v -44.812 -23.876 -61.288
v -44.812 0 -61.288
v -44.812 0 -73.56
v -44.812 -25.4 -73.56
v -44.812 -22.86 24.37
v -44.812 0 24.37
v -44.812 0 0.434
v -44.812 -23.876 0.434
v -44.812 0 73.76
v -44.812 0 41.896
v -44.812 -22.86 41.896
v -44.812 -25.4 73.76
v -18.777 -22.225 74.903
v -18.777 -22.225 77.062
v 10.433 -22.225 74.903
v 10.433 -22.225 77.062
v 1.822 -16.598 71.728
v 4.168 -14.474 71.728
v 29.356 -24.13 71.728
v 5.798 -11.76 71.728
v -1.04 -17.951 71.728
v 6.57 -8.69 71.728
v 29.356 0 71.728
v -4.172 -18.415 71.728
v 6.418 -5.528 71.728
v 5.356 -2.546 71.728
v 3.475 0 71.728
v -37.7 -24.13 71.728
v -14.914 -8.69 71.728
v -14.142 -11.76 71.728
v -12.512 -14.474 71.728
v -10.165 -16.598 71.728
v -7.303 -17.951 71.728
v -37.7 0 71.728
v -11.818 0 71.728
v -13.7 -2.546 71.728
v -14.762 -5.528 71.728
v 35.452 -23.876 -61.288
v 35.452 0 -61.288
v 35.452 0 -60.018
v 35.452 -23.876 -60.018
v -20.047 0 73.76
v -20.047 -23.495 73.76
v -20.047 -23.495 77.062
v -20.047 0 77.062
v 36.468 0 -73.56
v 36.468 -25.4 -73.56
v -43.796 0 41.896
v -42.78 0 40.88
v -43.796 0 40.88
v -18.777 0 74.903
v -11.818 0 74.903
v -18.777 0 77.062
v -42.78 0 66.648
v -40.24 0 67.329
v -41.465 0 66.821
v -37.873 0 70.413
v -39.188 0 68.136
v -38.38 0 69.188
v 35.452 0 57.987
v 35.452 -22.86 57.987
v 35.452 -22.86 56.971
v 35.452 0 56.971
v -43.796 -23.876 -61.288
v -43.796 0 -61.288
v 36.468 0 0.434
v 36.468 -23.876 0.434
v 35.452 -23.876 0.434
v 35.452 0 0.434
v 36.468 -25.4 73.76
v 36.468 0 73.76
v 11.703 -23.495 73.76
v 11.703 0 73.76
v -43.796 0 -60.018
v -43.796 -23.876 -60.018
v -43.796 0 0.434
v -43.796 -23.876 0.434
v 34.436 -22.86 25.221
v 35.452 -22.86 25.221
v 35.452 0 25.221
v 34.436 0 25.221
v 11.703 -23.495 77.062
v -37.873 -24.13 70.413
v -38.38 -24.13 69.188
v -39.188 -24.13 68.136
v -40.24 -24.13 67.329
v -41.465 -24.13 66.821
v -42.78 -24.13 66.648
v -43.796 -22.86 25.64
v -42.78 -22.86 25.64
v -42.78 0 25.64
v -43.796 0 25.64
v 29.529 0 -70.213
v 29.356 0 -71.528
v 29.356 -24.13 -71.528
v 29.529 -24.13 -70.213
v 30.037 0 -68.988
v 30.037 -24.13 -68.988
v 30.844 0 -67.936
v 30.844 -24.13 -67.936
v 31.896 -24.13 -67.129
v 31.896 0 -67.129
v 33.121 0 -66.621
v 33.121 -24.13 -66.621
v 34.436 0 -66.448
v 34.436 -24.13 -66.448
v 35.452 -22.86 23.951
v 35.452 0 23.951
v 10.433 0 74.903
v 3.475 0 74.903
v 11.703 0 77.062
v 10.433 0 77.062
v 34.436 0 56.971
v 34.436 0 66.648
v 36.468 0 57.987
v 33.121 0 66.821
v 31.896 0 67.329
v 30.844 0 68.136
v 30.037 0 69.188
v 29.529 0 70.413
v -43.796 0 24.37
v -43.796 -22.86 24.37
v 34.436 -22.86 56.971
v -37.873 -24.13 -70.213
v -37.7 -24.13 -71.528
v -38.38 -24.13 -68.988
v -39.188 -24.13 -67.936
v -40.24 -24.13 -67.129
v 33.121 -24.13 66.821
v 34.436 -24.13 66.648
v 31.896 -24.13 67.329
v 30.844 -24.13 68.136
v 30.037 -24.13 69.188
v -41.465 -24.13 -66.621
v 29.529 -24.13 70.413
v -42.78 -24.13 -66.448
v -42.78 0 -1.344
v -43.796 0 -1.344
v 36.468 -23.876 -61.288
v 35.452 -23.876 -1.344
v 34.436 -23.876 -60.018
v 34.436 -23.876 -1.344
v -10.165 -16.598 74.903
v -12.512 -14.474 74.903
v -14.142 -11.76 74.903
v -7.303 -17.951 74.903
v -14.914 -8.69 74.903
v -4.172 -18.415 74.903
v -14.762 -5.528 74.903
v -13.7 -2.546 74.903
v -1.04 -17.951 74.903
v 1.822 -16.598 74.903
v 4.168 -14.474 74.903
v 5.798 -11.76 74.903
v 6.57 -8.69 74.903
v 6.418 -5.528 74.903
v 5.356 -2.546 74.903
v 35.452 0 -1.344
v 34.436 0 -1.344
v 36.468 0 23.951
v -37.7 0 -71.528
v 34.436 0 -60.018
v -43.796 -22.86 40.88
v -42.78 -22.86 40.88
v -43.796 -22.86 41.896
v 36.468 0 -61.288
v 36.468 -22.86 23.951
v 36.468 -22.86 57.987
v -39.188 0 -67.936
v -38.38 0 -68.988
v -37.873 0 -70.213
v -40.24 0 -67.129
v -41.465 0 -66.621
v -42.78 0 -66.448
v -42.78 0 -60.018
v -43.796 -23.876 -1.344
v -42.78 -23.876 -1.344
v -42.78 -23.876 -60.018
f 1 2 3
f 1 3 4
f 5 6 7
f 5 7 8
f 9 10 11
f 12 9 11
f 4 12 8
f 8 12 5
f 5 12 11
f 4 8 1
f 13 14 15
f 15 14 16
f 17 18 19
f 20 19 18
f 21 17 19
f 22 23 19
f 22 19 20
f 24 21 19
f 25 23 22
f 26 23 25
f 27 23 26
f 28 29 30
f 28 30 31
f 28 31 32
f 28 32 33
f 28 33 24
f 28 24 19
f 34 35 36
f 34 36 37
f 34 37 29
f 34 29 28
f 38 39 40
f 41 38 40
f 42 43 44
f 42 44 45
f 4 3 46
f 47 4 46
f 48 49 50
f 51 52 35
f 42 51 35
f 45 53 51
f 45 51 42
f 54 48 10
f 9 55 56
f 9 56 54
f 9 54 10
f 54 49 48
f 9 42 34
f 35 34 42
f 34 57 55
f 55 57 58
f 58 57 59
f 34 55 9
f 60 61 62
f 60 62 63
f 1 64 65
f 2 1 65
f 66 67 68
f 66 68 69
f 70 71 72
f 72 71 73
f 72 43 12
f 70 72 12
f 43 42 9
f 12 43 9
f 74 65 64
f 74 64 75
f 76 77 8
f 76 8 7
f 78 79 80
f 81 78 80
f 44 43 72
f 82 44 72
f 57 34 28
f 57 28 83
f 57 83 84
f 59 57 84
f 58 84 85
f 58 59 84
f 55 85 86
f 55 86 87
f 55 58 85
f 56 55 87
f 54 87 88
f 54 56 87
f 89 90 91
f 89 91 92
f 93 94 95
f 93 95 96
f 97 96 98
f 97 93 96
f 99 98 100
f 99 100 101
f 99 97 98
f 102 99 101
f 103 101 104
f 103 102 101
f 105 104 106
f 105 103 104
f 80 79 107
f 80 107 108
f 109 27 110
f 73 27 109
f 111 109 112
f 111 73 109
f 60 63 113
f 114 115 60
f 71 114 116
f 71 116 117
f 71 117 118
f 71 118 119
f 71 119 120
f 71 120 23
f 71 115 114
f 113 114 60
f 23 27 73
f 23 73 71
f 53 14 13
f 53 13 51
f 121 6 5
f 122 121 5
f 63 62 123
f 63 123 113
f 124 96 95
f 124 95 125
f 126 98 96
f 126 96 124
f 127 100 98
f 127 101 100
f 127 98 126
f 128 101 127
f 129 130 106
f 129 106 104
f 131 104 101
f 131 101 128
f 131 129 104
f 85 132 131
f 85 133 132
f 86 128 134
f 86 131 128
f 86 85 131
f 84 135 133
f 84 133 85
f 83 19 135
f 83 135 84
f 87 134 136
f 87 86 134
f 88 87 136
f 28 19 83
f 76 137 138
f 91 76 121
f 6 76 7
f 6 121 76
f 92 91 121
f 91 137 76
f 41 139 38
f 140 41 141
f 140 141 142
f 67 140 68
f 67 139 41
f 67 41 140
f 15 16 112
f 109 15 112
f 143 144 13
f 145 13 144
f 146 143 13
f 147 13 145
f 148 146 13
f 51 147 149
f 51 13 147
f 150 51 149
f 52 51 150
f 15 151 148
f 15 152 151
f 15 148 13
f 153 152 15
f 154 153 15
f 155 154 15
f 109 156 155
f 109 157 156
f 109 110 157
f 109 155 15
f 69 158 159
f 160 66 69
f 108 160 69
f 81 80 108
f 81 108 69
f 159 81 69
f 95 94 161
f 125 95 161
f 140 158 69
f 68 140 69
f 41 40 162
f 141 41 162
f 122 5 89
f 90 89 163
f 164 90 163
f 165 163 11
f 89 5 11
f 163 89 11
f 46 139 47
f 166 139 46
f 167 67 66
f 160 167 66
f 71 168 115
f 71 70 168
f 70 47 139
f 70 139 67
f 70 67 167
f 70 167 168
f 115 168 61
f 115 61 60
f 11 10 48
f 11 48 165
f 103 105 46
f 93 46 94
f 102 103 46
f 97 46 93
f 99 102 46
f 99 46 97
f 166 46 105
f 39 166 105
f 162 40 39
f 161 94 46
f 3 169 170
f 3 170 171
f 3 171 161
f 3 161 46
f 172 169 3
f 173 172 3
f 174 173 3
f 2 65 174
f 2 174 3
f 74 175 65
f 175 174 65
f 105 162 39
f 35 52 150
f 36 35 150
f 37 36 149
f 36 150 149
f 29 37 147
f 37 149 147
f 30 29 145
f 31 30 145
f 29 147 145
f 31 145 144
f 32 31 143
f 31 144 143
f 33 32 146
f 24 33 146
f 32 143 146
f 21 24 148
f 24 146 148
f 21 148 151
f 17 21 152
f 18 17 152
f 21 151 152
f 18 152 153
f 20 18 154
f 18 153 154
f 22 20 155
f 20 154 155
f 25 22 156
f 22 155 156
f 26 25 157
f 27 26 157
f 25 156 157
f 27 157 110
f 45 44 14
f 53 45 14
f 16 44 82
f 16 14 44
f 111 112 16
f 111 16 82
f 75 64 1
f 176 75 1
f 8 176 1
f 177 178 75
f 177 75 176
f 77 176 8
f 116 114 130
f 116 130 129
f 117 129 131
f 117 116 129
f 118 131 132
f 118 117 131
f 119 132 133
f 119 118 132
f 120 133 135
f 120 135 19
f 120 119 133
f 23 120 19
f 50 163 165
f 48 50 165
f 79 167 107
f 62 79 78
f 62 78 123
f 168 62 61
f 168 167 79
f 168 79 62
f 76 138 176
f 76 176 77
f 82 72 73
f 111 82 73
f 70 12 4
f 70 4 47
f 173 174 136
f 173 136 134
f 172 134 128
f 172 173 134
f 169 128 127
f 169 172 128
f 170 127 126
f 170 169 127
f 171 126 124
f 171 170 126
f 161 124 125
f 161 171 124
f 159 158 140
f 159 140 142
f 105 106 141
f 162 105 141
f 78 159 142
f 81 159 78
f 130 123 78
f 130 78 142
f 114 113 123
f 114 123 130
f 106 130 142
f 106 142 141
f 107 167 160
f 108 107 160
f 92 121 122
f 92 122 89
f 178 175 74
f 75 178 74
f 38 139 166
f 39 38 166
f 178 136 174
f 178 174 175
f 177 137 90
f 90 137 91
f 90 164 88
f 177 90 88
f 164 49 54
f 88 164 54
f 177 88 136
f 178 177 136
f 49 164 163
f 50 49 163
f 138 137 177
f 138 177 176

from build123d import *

# Parameters (mm, degrees)
F1_DEPTH  = 25.4
F2_W      = 77.216
F2_H      = 143.256
F3_DEPTH  = 24.13
F4_W      = 0.889
F4_H      = 6.858
F4_W_2    = 6.858
F4_H_2    = 0.889
F5_DEPTH  = 81.281
F6_W      = 5.0038
F6_H      = 0.6858
F7_DEPTH  = 81.281
F8_W      = 5.0038
F8_H      = 0.6858
F9_DEPTH  = 2.032
F10_W     = 5.207
F10_H     = 9.652
F10_W_2   = 3.175
F10_H_2   = 7.62
F10_W_3   = 9.652
F10_H_3   = 5.207
F10_W_4   = 7.62
F10_H_4   = 3.175
F10_W_5   = 9.271
F11_DEPTH = 12.954
F12_W     = 9.144
F12_H     = 4.699
F12_W_2   = 7.62
F12_H_2   = 3.175
F13_DEPTH = 12.954
F14_W     = 0.889
F14_H     = 6.858
F14_W_2   = 6.858
F14_H_2   = 0.889
F15_DEPTH = 81.281
F16_W     = 5.207
F16_H     = 9.652
F16_W_2   = 3.175
F16_H_2   = 7.62
F16_W_3   = 9.652
F16_H_3   = 5.207
F16_W_4   = 7.62
F16_H_4   = 3.175
F17_DEPTH = 12.954
F18_W     = 5.207
F18_H     = 9.652
F18_W_2   = 3.175
F18_H_2   = 7.62
F18_W_3   = 9.652
F18_H_3   = 5.207
F18_W_4   = 7.62
F18_H_4   = 3.175
F19_DEPTH = 12.954
F21_DEPTH = 25.4
F22_W     = 31.75
F22_H     = 23.495
F23_DEPTH = 3.302
F24_W     = 29.21
F24_H     = 22.225
F25_DEPTH = 2.159
F27_DEPTH = 25.4
F29_W     = 22.86
F29_H     = 33.02
F30_DEPTH = 25.4
F31_W     = 22.86
F31_H     = 0.508
F32_DEPTH = 1.016
F34_W     = 22.86
F34_H     = 0.508
F35_DEPTH = 1.016
F36_W     = 22.86
F36_H     = 0.762
F37_DEPTH = 1.016
F33_W     = 22.86
F33_H     = 17.526
F38_DEPTH = 25.4
F39_W     = 1.016
F39_H     = 1.016
F40_DEPTH = 25.4
F41_W     = 1.016
F41_H     = 1.27
F42_DEPTH = 25.4
F43_W     = 23.876
F43_H     = 61.722
F44_DEPTH = 81.281
F45_W     = 1.016
F45_H     = 1.27
F46_DEPTH = 25.4
F47_W     = 1.016
F47_H     = 1.778
F48_DEPTH = 25.4
F49_W     = 1.016
F49_H     = 1.778
F50_DEPTH = 25.4


with BuildPart() as f1:
    # F0 (on Front) → F1 (new body)
    with BuildSketch(Plane.XZ):
        Polygon((36.468155, -40.539946), (36.468155, 73.760054), (-44.811845, 73.760054), (-44.811845, -40.539946), (-44.811845, -73.559946), (36.468155, -73.559946), align=None)
    extrude(amount=F1_DEPTH)

    # F2 (on face) → F3 (cut)
    with BuildSketch(Plane(origin=(0, 0, 0), x_dir=(-1, 0, 0), z_dir=(0, 1, 0))):
        with Locations((4.171845, 0.100054)):
            Rectangle(F2_W, F2_H)
    extrude(amount=-F3_DEPTH, mode=Mode.SUBTRACT)

    # F4 (on face) → F5 (cut, through all)
    with BuildSketch(Plane.YZ.offset(36.468155)):
        with Locations((-12.7, -11.420451)):
            Rectangle(F4_W, F4_H)
        with Locations((-12.7, -19.865951)):
            Rectangle(F4_W_2, F4_H_2)
        with Locations((-12.7, -27.866951)):
            Rectangle(F4_W_2, F4_H_2)
        with Locations((-21.0185, -19.484951)):
            Rectangle(F4_W, F4_H)
        with Locations((-4.3815, -19.484951)):
            Rectangle(F4_W, F4_H)
    extrude(amount=-F5_DEPTH, mode=Mode.SUBTRACT)

    # F6 (on face) → F7 (cut, through all)
    with BuildSketch(Plane.YZ.offset(36.468155)):
        with Locations((-17.4371, 28.509954)):
            Rectangle(F6_W, F6_H)
        with Locations((-7.9629, 28.509954)):
            Rectangle(F6_W, F6_H)
        with Locations((-17.4371, 36.815754)):
            Rectangle(F6_W, F6_H)
        with Locations((-7.9629, 36.815754)):
            Rectangle(F6_W, F6_H)
        with Locations((-17.4371, 45.121554)):
            Rectangle(F6_W, F6_H)
        with Locations((-7.9629, 45.121554)):
            Rectangle(F6_W, F6_H)
        with Locations((-17.4371, 53.427354)):
            Rectangle(F6_W, F6_H)
        with Locations((-7.9629, 53.427354)):
            Rectangle(F6_W, F6_H)
    extrude(amount=-F7_DEPTH, mode=Mode.SUBTRACT)

    # F8 (on face) → F9 (join)
    with BuildSketch(Plane(origin=(-44.811845, 0, 0), x_dir=(0, -1, 0), z_dir=(-1, 0, 0))):
        with Locations((7.9629, 53.427354)):
            Rectangle(F8_W, F8_H)
        with Locations((17.4371, 53.427354)):
            Rectangle(F8_W, F8_H)
        with Locations((7.9629, 45.121554)):
            Rectangle(F8_W, F8_H)
        with Locations((17.4371, 45.121554)):
            Rectangle(F8_W, F8_H)
    extrude(amount=-F9_DEPTH)

    # F10 (on face) → F11 (join)
    with BuildSketch(Plane.YZ.offset(36.468155)):
        with Locations((-12.7, -11.420451)):
            Rectangle(F10_W, F10_H)
        with Locations((-12.7, -11.420451)):
            Rectangle(F10_W_2, F10_H_2, mode=Mode.SUBTRACT)
        with Locations((-21.0185, -19.484951)):
            Rectangle(F10_W, F10_H)
        with Locations((-21.0185, -19.484951)):
            Rectangle(F10_W_2, F10_H_2, mode=Mode.SUBTRACT)
        with Locations((-4.3815, -19.484951)):
            Rectangle(F10_W, F10_H)
        with Locations((-4.3815, -19.484951)):
            Rectangle(F10_W_2, F10_H_2, mode=Mode.SUBTRACT)
        with Locations((-12.7, -19.865951)):
            Rectangle(F10_W_3, F10_H_3)
        with Locations((-12.7, -19.865951)):
            Rectangle(F10_W_4, F10_H_4, mode=Mode.SUBTRACT)
        with Locations((-12.8905, -27.866951)):
            Rectangle(F10_W_5, F10_H_3)
        with Locations((-12.7, -27.866951)):
            Rectangle(F10_W_4, F10_H_4, mode=Mode.SUBTRACT)
    extrude(amount=-F11_DEPTH)

    # F12 (on face) → F13 (join)
    with BuildSketch(Plane.YZ.offset(36.468155)):
        with Locations((-17.4371, 28.509954)):
            Rectangle(F12_W, F12_H)
        with Locations((-17.4371, 28.509954)):
            Rectangle(F12_W_2, F12_H_2, mode=Mode.SUBTRACT)
        with Locations((-7.9629, 28.509954)):
            Rectangle(F12_W, F12_H)
        with Locations((-7.9629, 28.509954)):
            Rectangle(F12_W_2, F12_H_2, mode=Mode.SUBTRACT)
        with Locations((-17.4371, 36.815754)):
            Rectangle(F12_W, F12_H)
        with Locations((-17.4371, 36.815754)):
            Rectangle(F12_W_2, F12_H_2, mode=Mode.SUBTRACT)
        with Locations((-7.9629, 36.815754)):
            Rectangle(F12_W, F12_H)
        with Locations((-7.9629, 36.815754)):
            Rectangle(F12_W_2, F12_H_2, mode=Mode.SUBTRACT)
        with Locations((-17.4371, 45.121554)):
            Rectangle(F12_W, F12_H)
        with Locations((-17.4371, 45.121554)):
            Rectangle(F12_W_2, F12_H_2, mode=Mode.SUBTRACT)
        with Locations((-7.9629, 45.121554)):
            Rectangle(F12_W, F12_H)
        with Locations((-7.9629, 45.121554)):
            Rectangle(F12_W_2, F12_H_2, mode=Mode.SUBTRACT)
        with Locations((-17.4371, 53.427354)):
            Rectangle(F12_W, F12_H)
        with Locations((-17.4371, 53.427354)):
            Rectangle(F12_W_2, F12_H_2, mode=Mode.SUBTRACT)
        with Locations((-7.9629, 53.427354)):
            Rectangle(F12_W, F12_H)
        with Locations((-7.9629, 53.427354)):
            Rectangle(F12_W_2, F12_H_2, mode=Mode.SUBTRACT)
    extrude(amount=-F13_DEPTH)

    # F14 (on face) → F15 (cut, through all)
    with BuildSketch(Plane.YZ.offset(36.468155)):
        with Locations((-12.7, -40.586743)):
            Rectangle(F14_W, F14_H)
        with Locations((-12.7, -49.032243)):
            Rectangle(F14_W_2, F14_H_2)
        with Locations((-12.7, -57.033243)):
            Rectangle(F14_W_2, F14_H_2)
        with Locations((-21.0185, -48.714743)):
            Rectangle(F14_W, F14_H)
        with Locations((-4.3815, -48.714743)):
            Rectangle(F14_W, F14_H)
    extrude(amount=-F15_DEPTH, mode=Mode.SUBTRACT)

    # F16 (on face) → F17 (join)
    with BuildSketch(Plane(origin=(-44.811845, 0, 0), x_dir=(0, -1, 0), z_dir=(-1, 0, 0))):
        with Locations((4.3815, -19.484951)):
            Rectangle(F16_W, F16_H)
        with Locations((4.3815, -19.484951)):
            Rectangle(F16_W_2, F16_H_2, mode=Mode.SUBTRACT)
        with Locations((12.7, -19.865951)):
            Rectangle(F16_W_3, F16_H_3)
        with Locations((12.7, -19.865951)):
            Rectangle(F16_W_4, F16_H_4, mode=Mode.SUBTRACT)
        with Locations((21.0185, -19.484951)):
            Rectangle(F16_W, F16_H)
        with Locations((21.0185, -19.484951)):
            Rectangle(F16_W_2, F16_H_2, mode=Mode.SUBTRACT)
        with Locations((12.7, -11.420451)):
            Rectangle(F16_W, F16_H)
        with Locations((12.7, -11.420451)):
            Rectangle(F16_W_2, F16_H_2, mode=Mode.SUBTRACT)
        with Locations((12.7, -27.866951)):
            Rectangle(F16_W_3, F16_H_3)
        with Locations((12.7, -27.866951)):
            Rectangle(F16_W_4, F16_H_4, mode=Mode.SUBTRACT)
        with Locations((4.3815, -48.714743)):
            Rectangle(F16_W, F16_H)
        with Locations((4.3815, -48.714743)):
            Rectangle(F16_W_2, F16_H_2, mode=Mode.SUBTRACT)
        with Locations((12.7, -49.032243)):
            Rectangle(F16_W_3, F16_H_3)
        with Locations((12.7, -49.032243)):
            Rectangle(F16_W_4, F16_H_4, mode=Mode.SUBTRACT)
        with Locations((21.0185, -48.714743)):
            Rectangle(F16_W, F16_H)
        with Locations((21.0185, -48.714743)):
            Rectangle(F16_W_2, F16_H_2, mode=Mode.SUBTRACT)
        with Locations((12.7, -40.586743)):
            Rectangle(F16_W, F16_H)
        with Locations((12.7, -40.586743)):
            Rectangle(F16_W_2, F16_H_2, mode=Mode.SUBTRACT)
        with Locations((12.7, -57.033243)):
            Rectangle(F16_W_3, F16_H_3)
        with Locations((12.7, -57.033243)):
            Rectangle(F16_W_4, F16_H_4, mode=Mode.SUBTRACT)
    extrude(amount=-F17_DEPTH)

    # F18 (on face) → F19 (join)
    with BuildSketch(Plane.YZ.offset(36.468155)):
        with Locations((-12.7, -40.586743)):
            Rectangle(F18_W, F18_H)
        with Locations((-12.7, -40.586743)):
            Rectangle(F18_W_2, F18_H_2, mode=Mode.SUBTRACT)
        with Locations((-4.3815, -48.714743)):
            Rectangle(F18_W, F18_H)
        with Locations((-4.3815, -48.714743)):
            Rectangle(F18_W_2, F18_H_2, mode=Mode.SUBTRACT)
        with Locations((-12.7, -49.032243)):
            Rectangle(F18_W_3, F18_H_3)
        with Locations((-12.7, -49.032243)):
            Rectangle(F18_W_4, F18_H_4, mode=Mode.SUBTRACT)
        with Locations((-21.0185, -48.714743)):
            Rectangle(F18_W, F18_H)
        with Locations((-21.0185, -48.714743)):
            Rectangle(F18_W_2, F18_H_2, mode=Mode.SUBTRACT)
        with Locations((-12.7, -57.033243)):
            Rectangle(F18_W_3, F18_H_3)
        with Locations((-12.7, -57.033243)):
            Rectangle(F18_W_4, F18_H_4, mode=Mode.SUBTRACT)
    extrude(amount=-F19_DEPTH)

    # F20 (on face) → F21 (join)
    with BuildSketch(Plane(origin=(0, 0, 0), x_dir=(-1, 0, 0), z_dir=(0, 1, 0))):
        with BuildLine():
            ThreePointArc((-34.436155, 66.648054), (-30.844053, 68.135951), (-29.356155, 71.728054))
            Line((-29.356155, 71.728054), (-34.436155, 71.728054))
            Line((-34.436155, 71.728054), (-34.436155, 66.648054))
        make_face()
        with BuildLine():
            Line((42.779845, 71.728054), (37.699845, 71.728054))
            ThreePointArc((37.699845, 71.728054), (39.187742, 68.135951), (42.779845, 66.648054))
            Line((42.779845, 66.648054), (42.779845, 71.728054))
        make_face()
        with BuildLine():
            Line((-34.436155, -71.527946), (-29.356155, -71.527946))
            ThreePointArc((-29.356155, -71.527946), (-30.844053, -67.935844), (-34.436155, -66.447946))
            Line((-34.436155, -66.447946), (-34.436155, -71.527946))
        make_face()
        with BuildLine():
            ThreePointArc((42.779845, -66.447946), (39.187742, -67.935844), (37.699845, -71.527946))
            Line((37.699845, -71.527946), (42.779845, -71.527946))
            Line((42.779845, -71.527946), (42.779845, -66.447946))
        make_face()
    extrude(amount=-F21_DEPTH)

    # F22 (on face) → F23 (join)
    with BuildSketch(Plane.XY.offset(73.760054)):
        with Locations((-4.171845, -11.7475)):
            Rectangle(F22_W, F22_H)
    extrude(amount=F23_DEPTH)

    # F24 (on face) → F25 (cut)
    with BuildSketch(Plane.XY.offset(77.062054)):
        with Locations((-4.171845, -11.1125)):
            Rectangle(F24_W, F24_H)
    extrude(amount=-F25_DEPTH, mode=Mode.SUBTRACT)

    # F26 (on face) → F27 (cut)
    with BuildSketch(Plane.XY.offset(74.903054)):
        with BuildLine():
            Line((3.474568, 0), (-11.818257, 0))
            ThreePointArc((-11.818257, 0), (-4.171845, -18.415), (3.474568, 0))
        make_face()
    extrude(amount=-F27_DEPTH, mode=Mode.SUBTRACT)

    # F29 (on face) → F30 (cut)
    with BuildSketch(Plane.YZ.offset(36.468155)):
        with Locations((-11.43, 40.968654)):
            Rectangle(F29_W, F29_H)
    extrude(amount=-F30_DEPTH, mode=Mode.SUBTRACT)

    # F31 (on face) → F32 (cut)
    with BuildSketch(Plane.YZ.offset(36.468155)):
        with Locations((-11.43, 57.732654)):
            Rectangle(F31_W, F31_H)
        with Locations((-11.43, 24.204654)):
            Rectangle(F31_W, F31_H)
    extrude(amount=-F32_DEPTH, mode=Mode.SUBTRACT)

    # F34 (on face) → F35 (join)
    with BuildSketch(Plane.YZ.offset(35.452155)):
        with Locations((-11.43, 57.224654)):
            Rectangle(F34_W, F34_H)
    extrude(amount=-F35_DEPTH)

    # F36 (on face) → F37 (join)
    with BuildSketch(Plane.YZ.offset(35.452155)):
        with Locations((-11.43, 24.839654)):
            Rectangle(F36_W, F36_H)
    extrude(amount=-F37_DEPTH)

    # F33 (on face) → F38 (cut)
    with BuildSketch(Plane(origin=(-44.811845, 0, 0), x_dir=(0, -1, 0), z_dir=(-1, 0, 0))):
        with Locations((11.43, 33.132754)):
            Rectangle(F33_W, F33_H)
    extrude(amount=-F38_DEPTH, mode=Mode.SUBTRACT)

    # F39 (on face) → F40 (join)
    with BuildSketch(Plane(origin=(0, 0, 0), x_dir=(-1, 0, 0), z_dir=(0, 1, 0))):
        with Locations((43.287845, 41.387754)):
            Rectangle(F39_W, F39_H)
    extrude(amount=-F40_DEPTH)

    # F41 (on face) → F42 (join)
    with BuildSketch(Plane(origin=(0, 0, 0), x_dir=(-1, 0, 0), z_dir=(0, 1, 0))):
        with Locations((43.287845, 25.004754)):
            Rectangle(F41_W, F41_H)
    extrude(amount=-F42_DEPTH)

    # F43 (on face) → F44 (cut, through all)
    with BuildSketch(Plane.YZ.offset(36.468155)):
        with Locations((-11.938, -30.426743)):
            Rectangle(F43_W, F43_H)
    extrude(amount=-F44_DEPTH, mode=Mode.SUBTRACT)

    # F45 (on face) → F46 (join)
    with BuildSketch(Plane(origin=(0, 0, 0), x_dir=(-1, 0, 0), z_dir=(0, 1, 0))):
        with Locations((-34.944155, -60.652743)):
            Rectangle(F45_W, F45_H)
        with Locations((43.287845, -60.652743)):
            Rectangle(F45_W, F45_H)
    extrude(amount=-F46_DEPTH)

    # F47 (on face) → F48 (join)
    with BuildSketch(Plane(origin=(0, 0, 0), x_dir=(-1, 0, 0), z_dir=(0, 1, 0))):
        with Locations((-34.944155, -0.454743)):
            Rectangle(F47_W, F47_H)
    extrude(amount=-F48_DEPTH)

    # F49 (on face) → F50 (join)
    with BuildSketch(Plane(origin=(0, 0, 0), x_dir=(-1, 0, 0), z_dir=(0, 1, 0))):
        with Locations((43.287845, -0.454743)):
            Rectangle(F49_W, F49_H)
    extrude(amount=-F50_DEPTH)


solid = f1.part
